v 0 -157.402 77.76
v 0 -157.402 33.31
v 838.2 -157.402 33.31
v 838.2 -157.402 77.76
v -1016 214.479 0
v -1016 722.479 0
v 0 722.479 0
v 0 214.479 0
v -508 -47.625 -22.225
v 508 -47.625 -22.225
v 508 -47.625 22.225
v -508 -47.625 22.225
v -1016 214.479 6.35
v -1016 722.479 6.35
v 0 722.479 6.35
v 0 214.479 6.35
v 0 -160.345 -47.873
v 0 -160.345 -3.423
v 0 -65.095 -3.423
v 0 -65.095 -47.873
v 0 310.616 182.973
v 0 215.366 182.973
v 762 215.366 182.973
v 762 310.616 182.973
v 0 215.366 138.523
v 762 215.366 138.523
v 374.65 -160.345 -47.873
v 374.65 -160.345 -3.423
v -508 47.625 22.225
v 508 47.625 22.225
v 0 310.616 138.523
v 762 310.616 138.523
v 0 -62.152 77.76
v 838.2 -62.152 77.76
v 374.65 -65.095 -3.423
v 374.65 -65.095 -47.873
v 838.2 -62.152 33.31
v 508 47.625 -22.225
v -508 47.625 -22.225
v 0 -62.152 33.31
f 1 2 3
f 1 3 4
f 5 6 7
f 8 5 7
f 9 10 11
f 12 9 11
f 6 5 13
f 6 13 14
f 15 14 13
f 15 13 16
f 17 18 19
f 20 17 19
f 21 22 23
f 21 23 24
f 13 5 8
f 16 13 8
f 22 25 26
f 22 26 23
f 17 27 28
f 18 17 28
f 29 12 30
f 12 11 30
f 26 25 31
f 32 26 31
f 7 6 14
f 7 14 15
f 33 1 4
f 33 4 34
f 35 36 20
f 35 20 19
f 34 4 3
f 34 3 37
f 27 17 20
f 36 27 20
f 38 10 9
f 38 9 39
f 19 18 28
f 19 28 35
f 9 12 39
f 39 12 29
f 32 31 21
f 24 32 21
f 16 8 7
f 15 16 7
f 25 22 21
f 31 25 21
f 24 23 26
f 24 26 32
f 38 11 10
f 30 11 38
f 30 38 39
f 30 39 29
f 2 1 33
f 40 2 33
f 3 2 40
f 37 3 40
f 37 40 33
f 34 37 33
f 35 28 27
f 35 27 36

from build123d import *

# Parameters (mm, degrees)
F0_W     = 95.25
F0_H     = 44.45
F1_DEPTH = 508
F2_W     = 95.25
F2_H     = 44.45
F3_DEPTH = 762
F4_W     = 95.25
F4_H     = 44.45
F5_DEPTH = 838.2
F6_W     = 95.25
F6_H     = 44.45
F7_DEPTH = 374.65
F8_W     = 1016
F8_H     = 508
F9_DEPTH = 6.35


with BuildPart() as f1:
    # F0 (on Right) → F1 (new body, symmetric)
    with BuildSketch(Plane.YZ):
        Rectangle(F0_W, F0_H)
    extrude(amount=F1_DEPTH, both=True)


with BuildPart() as f3:
    # F2 (on Right) → F3 (new body)
    with BuildSketch(Plane.YZ):
        with Locations((262.991309, 160.748305)):
            Rectangle(F2_W, F2_H)
    extrude(amount=F3_DEPTH)


with BuildPart() as f5:
    # F4 (on Right) → F5 (new body)
    with BuildSketch(Plane.YZ):
        with Locations((-109.776534, 55.535162)):
            Rectangle(F4_W, F4_H)
    extrude(amount=F5_DEPTH)


with BuildPart() as f7:
    # F6 (on Right) → F7 (new body)
    with BuildSketch(Plane.YZ):
        with Locations((-112.719905, -25.647794)):
            Rectangle(F6_W, F6_H)
    extrude(amount=F7_DEPTH)


with BuildPart() as f9:
    # F8 (on Top) → F9 (new body)
    with BuildSketch(Plane.XY):
        with Locations((-508, 468.479476)):
            Rectangle(F8_W, F8_H)
    extrude(amount=F9_DEPTH)


solid = Compound([f1.part, f3.part, f5.part, f7.part, f9.part])
